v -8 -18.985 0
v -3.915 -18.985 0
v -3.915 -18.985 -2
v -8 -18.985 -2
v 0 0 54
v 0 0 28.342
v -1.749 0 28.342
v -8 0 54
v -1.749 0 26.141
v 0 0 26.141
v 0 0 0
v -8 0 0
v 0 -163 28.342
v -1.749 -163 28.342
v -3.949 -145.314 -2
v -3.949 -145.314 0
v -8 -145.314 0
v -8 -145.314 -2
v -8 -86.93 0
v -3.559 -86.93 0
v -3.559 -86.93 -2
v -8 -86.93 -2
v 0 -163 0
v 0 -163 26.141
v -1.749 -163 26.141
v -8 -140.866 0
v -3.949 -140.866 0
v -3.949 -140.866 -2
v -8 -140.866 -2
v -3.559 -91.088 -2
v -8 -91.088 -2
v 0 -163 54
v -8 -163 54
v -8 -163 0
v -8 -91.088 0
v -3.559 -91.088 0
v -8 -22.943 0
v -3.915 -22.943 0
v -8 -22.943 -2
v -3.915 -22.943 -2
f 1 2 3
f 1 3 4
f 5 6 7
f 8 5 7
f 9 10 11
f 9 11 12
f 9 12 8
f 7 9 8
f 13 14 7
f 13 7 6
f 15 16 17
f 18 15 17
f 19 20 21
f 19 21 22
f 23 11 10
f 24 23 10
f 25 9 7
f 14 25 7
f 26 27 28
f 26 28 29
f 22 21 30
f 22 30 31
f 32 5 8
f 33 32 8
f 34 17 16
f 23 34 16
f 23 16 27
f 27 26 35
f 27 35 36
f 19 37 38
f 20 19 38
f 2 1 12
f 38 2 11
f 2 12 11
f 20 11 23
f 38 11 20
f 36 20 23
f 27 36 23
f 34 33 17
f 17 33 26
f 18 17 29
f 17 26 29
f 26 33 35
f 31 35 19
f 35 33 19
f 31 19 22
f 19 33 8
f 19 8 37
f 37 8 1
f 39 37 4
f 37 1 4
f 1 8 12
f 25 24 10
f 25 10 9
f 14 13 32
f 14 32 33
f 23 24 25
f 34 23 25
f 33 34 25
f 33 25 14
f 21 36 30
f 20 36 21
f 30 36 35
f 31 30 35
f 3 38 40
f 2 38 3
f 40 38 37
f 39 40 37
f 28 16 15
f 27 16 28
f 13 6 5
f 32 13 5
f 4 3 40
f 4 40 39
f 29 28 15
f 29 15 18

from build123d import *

# Parameters (mm, degrees)
EXTRUDE_1_DEPTH = 163
SKETCH_2_W      = 4.084844537
SKETCH_2_H      = 3.957854635
EXTRUDE_2_DEPTH = 2
SKETCH_3_W      = 4.4411109
SKETCH_3_H      = 4.15824399
EXTRUDE_3_DEPTH = 2
SKETCH_4_W      = 4.050772352
SKETCH_4_H      = 4.448077529
EXTRUDE_4_DEPTH = 2


with BuildPart() as part:
    # 草图1 → 凸台-拉伸1 (new body)
    with BuildSketch(Plane(origin=(0, 0, 0), x_dir=(1, 0, 0), z_dir=(0, 1, 0))):
        Polygon((0, -26.141443499), (-1.748690073, -26.141443499), (-1.748690073, -28.342387862), (0, -28.342387862), (0, -54), (-8, -54), (-8, 0), (0, 0), align=None)
    extrude(amount=-EXTRUDE_1_DEPTH)

    # 草图2 → 凸台-拉伸2 (add)
    with BuildSketch(Plane(origin=(0, 0, 0), x_dir=(-1, 0, 0), z_dir=(0, 0, -1))):
        with Locations((5.957577731, -20.96402105)):
            Rectangle(SKETCH_2_W, SKETCH_2_H)
    extrude(amount=EXTRUDE_2_DEPTH)

    # 草图3 → 凸台-拉伸3 (add)
    with BuildSketch(Plane(origin=(0, 0, 0), x_dir=(-1, 0, 0), z_dir=(0, 0, -1))):
        with Locations((5.77944455, -89.008990741)):
            Rectangle(SKETCH_3_W, SKETCH_3_H)
    extrude(amount=EXTRUDE_3_DEPTH)

    # 草图4 → 凸台-拉伸4 (add)
    with BuildSketch(Plane(origin=(0, 0, 0), x_dir=(-1, 0, 0), z_dir=(0, 0, -1))):
        with Locations((5.974613824, -143.08995755)):
            Rectangle(SKETCH_4_W, SKETCH_4_H)
    extrude(amount=EXTRUDE_4_DEPTH)


solid = part.part
